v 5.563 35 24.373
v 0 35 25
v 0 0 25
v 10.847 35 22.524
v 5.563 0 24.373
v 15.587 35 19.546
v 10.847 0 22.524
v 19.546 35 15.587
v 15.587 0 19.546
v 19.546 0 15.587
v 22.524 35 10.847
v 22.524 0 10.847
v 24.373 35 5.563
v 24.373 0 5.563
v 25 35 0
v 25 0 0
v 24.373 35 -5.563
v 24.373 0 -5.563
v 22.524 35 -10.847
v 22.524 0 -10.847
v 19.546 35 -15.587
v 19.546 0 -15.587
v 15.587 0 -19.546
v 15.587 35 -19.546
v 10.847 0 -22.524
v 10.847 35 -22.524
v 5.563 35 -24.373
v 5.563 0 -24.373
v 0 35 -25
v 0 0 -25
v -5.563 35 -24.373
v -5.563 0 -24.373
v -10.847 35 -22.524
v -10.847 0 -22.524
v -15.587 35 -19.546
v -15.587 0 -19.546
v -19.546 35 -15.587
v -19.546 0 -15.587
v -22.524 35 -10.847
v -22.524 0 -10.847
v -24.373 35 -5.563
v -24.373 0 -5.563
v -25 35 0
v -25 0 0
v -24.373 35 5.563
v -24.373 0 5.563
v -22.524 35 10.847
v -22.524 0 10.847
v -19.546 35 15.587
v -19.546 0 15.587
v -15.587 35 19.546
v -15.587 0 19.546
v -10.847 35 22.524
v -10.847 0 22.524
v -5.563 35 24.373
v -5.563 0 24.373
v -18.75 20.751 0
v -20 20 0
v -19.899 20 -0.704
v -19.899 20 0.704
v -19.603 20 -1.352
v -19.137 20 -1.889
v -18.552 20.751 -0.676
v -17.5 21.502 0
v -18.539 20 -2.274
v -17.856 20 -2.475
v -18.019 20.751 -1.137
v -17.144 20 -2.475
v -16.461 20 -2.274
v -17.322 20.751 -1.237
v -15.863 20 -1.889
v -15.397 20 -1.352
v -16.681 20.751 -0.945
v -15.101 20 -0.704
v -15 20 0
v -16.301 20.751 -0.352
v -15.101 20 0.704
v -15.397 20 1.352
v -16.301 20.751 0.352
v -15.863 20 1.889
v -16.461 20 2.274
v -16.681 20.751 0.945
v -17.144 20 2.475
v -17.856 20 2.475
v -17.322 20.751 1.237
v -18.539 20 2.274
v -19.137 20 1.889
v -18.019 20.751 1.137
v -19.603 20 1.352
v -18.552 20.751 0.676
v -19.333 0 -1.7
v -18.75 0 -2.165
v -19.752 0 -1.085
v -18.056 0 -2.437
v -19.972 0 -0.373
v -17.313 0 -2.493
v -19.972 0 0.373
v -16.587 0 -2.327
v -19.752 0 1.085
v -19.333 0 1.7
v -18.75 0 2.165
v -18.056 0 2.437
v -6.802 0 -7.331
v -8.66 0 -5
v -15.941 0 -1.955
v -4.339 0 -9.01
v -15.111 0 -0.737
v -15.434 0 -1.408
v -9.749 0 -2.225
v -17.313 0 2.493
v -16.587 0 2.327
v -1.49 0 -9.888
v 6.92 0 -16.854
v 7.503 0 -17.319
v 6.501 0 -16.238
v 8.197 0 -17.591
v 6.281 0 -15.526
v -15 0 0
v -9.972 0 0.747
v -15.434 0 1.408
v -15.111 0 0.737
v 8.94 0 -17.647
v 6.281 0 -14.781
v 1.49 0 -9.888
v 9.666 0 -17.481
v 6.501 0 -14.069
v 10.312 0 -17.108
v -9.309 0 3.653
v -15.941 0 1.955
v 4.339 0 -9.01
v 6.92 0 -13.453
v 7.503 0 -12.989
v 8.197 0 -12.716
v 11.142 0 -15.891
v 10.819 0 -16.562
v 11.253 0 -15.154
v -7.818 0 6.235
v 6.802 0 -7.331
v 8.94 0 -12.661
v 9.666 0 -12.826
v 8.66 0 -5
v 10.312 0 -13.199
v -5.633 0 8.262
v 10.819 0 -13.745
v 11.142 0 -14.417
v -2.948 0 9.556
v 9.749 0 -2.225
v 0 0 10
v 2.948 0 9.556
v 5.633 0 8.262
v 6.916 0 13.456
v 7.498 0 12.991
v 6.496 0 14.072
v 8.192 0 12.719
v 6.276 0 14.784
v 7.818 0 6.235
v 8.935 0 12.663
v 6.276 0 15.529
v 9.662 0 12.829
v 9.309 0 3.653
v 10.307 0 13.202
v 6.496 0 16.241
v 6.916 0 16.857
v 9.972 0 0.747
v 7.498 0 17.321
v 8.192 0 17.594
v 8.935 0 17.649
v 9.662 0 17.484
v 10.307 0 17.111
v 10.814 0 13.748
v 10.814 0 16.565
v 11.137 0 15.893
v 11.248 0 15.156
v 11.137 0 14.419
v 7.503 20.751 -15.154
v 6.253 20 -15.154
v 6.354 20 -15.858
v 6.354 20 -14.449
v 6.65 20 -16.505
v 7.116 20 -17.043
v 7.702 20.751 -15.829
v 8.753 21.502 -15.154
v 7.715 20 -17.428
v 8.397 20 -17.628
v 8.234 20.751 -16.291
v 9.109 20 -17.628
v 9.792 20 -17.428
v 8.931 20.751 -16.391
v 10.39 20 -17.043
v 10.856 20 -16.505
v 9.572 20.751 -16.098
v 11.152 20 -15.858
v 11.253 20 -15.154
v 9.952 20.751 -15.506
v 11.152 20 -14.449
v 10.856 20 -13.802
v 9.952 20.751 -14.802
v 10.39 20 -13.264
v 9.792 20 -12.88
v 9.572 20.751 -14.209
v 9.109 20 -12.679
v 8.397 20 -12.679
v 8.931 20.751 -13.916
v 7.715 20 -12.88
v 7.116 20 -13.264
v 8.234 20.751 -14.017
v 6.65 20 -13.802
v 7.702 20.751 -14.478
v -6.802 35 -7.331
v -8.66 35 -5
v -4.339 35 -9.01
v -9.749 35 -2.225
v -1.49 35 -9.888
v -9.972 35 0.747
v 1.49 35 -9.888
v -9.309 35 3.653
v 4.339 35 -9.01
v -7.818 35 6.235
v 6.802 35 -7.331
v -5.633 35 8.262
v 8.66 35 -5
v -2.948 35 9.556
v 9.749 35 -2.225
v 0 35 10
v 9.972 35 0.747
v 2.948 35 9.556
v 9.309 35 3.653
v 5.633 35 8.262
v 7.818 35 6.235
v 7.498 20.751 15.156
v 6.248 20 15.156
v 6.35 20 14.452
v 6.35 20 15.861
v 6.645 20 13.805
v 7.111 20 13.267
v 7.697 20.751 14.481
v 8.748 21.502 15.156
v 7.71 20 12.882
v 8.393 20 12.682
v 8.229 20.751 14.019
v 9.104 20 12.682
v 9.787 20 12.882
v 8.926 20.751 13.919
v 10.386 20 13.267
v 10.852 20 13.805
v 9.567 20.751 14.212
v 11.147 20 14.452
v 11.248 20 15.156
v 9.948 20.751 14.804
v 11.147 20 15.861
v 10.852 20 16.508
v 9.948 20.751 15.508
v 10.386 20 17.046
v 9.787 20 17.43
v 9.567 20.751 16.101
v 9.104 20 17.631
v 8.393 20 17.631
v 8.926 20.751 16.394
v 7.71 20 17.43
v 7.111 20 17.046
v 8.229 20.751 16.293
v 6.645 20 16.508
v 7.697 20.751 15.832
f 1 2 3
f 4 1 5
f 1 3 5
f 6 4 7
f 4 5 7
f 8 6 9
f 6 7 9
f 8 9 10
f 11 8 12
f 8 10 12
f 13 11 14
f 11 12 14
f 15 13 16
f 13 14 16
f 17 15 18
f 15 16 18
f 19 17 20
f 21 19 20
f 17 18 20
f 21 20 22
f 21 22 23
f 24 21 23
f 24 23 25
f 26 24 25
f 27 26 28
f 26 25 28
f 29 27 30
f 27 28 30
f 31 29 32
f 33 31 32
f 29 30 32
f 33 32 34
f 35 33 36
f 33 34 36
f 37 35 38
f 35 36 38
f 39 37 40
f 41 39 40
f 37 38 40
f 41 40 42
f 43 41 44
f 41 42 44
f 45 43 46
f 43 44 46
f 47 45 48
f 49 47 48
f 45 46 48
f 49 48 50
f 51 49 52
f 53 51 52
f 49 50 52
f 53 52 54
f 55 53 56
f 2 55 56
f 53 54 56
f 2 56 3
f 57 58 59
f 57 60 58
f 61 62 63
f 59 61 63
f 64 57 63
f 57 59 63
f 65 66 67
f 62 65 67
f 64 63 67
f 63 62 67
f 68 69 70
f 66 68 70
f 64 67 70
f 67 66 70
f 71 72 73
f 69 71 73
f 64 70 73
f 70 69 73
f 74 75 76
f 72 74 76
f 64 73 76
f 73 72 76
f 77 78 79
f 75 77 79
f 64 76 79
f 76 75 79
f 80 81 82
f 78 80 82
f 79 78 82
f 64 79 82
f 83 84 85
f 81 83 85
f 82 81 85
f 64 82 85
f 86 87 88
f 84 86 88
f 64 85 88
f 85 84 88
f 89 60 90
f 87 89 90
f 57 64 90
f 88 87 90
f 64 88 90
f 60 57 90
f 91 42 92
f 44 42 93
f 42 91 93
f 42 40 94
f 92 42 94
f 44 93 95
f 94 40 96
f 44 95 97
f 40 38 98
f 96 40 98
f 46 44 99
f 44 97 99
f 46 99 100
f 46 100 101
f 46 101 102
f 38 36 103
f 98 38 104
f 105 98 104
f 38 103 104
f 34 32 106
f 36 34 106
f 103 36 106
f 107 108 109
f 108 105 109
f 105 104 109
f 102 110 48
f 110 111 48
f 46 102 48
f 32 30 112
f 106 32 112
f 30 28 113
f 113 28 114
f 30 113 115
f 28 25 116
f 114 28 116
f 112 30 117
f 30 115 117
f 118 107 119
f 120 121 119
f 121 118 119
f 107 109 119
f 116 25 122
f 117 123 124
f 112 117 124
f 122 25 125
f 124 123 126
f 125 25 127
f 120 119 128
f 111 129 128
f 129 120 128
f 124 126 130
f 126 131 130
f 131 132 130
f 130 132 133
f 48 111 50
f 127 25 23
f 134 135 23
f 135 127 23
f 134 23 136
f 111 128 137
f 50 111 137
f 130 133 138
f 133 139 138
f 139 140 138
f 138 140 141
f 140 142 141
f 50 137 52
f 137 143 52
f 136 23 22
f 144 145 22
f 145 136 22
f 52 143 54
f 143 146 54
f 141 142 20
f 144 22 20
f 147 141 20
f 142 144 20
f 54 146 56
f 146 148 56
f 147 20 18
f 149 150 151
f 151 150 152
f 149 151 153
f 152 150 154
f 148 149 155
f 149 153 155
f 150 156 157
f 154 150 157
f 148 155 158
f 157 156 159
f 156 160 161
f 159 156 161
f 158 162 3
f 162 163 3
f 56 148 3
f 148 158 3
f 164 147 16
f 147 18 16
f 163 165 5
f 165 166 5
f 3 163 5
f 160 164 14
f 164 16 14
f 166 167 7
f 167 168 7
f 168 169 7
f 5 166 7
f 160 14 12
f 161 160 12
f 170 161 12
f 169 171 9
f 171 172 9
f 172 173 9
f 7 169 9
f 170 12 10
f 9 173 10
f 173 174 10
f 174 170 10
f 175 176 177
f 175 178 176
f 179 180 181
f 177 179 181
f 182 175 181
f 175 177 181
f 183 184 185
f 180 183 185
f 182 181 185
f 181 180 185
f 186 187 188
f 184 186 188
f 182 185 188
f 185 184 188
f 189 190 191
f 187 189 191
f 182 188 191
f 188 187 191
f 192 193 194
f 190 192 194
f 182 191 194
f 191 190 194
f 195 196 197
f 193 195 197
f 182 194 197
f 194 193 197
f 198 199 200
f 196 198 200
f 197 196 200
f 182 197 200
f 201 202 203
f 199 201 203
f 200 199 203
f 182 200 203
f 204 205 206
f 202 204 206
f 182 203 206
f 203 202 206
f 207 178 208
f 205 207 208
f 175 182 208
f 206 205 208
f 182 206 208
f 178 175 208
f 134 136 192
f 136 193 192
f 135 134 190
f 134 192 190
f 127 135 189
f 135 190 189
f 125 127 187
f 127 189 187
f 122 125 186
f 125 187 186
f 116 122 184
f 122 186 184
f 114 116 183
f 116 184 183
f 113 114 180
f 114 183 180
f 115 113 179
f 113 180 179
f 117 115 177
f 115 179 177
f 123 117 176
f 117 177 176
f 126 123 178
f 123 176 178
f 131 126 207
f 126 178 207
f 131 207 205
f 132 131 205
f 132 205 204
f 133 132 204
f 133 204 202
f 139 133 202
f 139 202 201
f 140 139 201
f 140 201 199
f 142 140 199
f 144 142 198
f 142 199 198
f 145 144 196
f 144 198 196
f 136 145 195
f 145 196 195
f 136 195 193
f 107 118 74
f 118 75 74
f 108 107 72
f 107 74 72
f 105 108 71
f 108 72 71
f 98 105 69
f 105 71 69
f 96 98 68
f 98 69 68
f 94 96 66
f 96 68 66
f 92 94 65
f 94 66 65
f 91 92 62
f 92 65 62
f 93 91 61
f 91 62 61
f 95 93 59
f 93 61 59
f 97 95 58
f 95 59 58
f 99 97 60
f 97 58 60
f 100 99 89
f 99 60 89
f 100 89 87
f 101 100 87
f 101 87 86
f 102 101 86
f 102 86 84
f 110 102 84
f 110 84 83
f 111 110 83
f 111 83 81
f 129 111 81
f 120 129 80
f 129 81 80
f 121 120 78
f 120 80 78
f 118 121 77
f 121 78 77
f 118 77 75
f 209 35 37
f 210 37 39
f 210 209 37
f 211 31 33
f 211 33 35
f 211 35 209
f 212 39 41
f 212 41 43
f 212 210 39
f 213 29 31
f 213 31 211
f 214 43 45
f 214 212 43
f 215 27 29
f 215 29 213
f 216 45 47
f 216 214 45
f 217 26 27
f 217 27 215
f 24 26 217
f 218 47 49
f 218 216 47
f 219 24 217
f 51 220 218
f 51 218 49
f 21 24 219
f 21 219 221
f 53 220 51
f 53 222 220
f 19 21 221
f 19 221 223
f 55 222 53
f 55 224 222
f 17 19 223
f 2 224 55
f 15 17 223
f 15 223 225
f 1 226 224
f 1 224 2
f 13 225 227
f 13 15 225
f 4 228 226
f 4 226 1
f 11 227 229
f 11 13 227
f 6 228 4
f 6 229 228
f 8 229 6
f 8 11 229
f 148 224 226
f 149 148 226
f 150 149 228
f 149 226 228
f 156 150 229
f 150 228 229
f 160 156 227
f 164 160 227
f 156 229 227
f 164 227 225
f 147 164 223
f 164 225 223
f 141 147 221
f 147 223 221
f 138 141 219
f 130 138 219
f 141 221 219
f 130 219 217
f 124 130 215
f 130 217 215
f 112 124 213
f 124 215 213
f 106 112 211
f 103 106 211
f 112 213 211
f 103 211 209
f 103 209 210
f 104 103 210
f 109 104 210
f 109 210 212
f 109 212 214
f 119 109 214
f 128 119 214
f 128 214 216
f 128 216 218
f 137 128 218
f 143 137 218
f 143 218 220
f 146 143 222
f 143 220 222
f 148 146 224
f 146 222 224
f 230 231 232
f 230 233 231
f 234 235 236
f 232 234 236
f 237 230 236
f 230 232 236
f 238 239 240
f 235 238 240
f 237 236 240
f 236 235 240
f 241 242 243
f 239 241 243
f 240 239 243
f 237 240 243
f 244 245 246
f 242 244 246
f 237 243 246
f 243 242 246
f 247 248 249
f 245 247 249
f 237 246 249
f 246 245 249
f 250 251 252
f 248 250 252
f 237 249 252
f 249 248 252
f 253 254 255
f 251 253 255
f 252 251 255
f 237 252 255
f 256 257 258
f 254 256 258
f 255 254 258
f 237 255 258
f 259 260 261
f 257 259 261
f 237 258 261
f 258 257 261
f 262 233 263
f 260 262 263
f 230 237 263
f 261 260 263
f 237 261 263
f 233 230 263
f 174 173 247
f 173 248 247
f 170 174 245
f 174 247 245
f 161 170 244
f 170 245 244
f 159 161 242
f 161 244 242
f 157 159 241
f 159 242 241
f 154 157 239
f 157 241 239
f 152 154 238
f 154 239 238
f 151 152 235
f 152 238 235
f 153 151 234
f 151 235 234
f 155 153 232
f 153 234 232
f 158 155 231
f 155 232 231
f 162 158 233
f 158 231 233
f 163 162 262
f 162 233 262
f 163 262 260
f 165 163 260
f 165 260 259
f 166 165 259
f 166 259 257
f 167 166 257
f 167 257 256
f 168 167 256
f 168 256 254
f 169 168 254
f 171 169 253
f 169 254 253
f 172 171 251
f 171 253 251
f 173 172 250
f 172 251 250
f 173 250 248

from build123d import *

# Parameters (mm, degrees)
ESQUISSE2_R             = 25
BOSS_EXTRU_1_DEPTH      = 35
ESQUISSE3_R             = 10
ENL_V_MAT_EXTRU_1_DEPTH = 35
TROU_TARAUD_M62_D       = 5
TROU_TARAUD_M62_DEPTH   = 20
TROU_TARAUD_M62_TIP     = 1.502151548


with BuildPart() as part:
    # Esquisse2 → Boss.-Extru.1 (new body)
    with BuildSketch(Plane(origin=(0, 0, 0), x_dir=(1, 0, 0), z_dir=(0, 1, 0))):
        with Locations(Location((0, 0, 0), (0, 0, 270))):  # turned: the seam where the file's is
            Circle(ESQUISSE2_R)
    extrude(amount=BOSS_EXTRU_1_DEPTH)

    # Esquisse3 → Enlèv. mat.-Extru.1 (cut)
    with BuildSketch(Plane(origin=(0, 35, 0), x_dir=(1, 0, 0), z_dir=(0, 1, 0))):
        with Locations(Location((0, 0, 0), (0, 0, 270))):  # turned: the seam where the file's is
            Circle(ESQUISSE3_R)
    extrude(amount=-ENL_V_MAT_EXTRU_1_DEPTH, mode=Mode.SUBTRACT)

    # Trou taraudé M62
    with Locations(Plane(origin=(0, 0, 0), x_dir=(-1, 0, 0), z_dir=(0, -1, 0))):
        with Locations((17.5, 0), (-8.74846, -15.156333581), (-8.753079729, 15.153666067)):
            Hole(TROU_TARAUD_M62_D / 2, depth=TROU_TARAUD_M62_DEPTH)
            with Locations((0, 0, -(TROU_TARAUD_M62_DEPTH + TROU_TARAUD_M62_TIP / 2))):  # 118° drill point
                Cone(0, TROU_TARAUD_M62_D / 2, TROU_TARAUD_M62_TIP, mode=Mode.SUBTRACT)


solid = part.part
